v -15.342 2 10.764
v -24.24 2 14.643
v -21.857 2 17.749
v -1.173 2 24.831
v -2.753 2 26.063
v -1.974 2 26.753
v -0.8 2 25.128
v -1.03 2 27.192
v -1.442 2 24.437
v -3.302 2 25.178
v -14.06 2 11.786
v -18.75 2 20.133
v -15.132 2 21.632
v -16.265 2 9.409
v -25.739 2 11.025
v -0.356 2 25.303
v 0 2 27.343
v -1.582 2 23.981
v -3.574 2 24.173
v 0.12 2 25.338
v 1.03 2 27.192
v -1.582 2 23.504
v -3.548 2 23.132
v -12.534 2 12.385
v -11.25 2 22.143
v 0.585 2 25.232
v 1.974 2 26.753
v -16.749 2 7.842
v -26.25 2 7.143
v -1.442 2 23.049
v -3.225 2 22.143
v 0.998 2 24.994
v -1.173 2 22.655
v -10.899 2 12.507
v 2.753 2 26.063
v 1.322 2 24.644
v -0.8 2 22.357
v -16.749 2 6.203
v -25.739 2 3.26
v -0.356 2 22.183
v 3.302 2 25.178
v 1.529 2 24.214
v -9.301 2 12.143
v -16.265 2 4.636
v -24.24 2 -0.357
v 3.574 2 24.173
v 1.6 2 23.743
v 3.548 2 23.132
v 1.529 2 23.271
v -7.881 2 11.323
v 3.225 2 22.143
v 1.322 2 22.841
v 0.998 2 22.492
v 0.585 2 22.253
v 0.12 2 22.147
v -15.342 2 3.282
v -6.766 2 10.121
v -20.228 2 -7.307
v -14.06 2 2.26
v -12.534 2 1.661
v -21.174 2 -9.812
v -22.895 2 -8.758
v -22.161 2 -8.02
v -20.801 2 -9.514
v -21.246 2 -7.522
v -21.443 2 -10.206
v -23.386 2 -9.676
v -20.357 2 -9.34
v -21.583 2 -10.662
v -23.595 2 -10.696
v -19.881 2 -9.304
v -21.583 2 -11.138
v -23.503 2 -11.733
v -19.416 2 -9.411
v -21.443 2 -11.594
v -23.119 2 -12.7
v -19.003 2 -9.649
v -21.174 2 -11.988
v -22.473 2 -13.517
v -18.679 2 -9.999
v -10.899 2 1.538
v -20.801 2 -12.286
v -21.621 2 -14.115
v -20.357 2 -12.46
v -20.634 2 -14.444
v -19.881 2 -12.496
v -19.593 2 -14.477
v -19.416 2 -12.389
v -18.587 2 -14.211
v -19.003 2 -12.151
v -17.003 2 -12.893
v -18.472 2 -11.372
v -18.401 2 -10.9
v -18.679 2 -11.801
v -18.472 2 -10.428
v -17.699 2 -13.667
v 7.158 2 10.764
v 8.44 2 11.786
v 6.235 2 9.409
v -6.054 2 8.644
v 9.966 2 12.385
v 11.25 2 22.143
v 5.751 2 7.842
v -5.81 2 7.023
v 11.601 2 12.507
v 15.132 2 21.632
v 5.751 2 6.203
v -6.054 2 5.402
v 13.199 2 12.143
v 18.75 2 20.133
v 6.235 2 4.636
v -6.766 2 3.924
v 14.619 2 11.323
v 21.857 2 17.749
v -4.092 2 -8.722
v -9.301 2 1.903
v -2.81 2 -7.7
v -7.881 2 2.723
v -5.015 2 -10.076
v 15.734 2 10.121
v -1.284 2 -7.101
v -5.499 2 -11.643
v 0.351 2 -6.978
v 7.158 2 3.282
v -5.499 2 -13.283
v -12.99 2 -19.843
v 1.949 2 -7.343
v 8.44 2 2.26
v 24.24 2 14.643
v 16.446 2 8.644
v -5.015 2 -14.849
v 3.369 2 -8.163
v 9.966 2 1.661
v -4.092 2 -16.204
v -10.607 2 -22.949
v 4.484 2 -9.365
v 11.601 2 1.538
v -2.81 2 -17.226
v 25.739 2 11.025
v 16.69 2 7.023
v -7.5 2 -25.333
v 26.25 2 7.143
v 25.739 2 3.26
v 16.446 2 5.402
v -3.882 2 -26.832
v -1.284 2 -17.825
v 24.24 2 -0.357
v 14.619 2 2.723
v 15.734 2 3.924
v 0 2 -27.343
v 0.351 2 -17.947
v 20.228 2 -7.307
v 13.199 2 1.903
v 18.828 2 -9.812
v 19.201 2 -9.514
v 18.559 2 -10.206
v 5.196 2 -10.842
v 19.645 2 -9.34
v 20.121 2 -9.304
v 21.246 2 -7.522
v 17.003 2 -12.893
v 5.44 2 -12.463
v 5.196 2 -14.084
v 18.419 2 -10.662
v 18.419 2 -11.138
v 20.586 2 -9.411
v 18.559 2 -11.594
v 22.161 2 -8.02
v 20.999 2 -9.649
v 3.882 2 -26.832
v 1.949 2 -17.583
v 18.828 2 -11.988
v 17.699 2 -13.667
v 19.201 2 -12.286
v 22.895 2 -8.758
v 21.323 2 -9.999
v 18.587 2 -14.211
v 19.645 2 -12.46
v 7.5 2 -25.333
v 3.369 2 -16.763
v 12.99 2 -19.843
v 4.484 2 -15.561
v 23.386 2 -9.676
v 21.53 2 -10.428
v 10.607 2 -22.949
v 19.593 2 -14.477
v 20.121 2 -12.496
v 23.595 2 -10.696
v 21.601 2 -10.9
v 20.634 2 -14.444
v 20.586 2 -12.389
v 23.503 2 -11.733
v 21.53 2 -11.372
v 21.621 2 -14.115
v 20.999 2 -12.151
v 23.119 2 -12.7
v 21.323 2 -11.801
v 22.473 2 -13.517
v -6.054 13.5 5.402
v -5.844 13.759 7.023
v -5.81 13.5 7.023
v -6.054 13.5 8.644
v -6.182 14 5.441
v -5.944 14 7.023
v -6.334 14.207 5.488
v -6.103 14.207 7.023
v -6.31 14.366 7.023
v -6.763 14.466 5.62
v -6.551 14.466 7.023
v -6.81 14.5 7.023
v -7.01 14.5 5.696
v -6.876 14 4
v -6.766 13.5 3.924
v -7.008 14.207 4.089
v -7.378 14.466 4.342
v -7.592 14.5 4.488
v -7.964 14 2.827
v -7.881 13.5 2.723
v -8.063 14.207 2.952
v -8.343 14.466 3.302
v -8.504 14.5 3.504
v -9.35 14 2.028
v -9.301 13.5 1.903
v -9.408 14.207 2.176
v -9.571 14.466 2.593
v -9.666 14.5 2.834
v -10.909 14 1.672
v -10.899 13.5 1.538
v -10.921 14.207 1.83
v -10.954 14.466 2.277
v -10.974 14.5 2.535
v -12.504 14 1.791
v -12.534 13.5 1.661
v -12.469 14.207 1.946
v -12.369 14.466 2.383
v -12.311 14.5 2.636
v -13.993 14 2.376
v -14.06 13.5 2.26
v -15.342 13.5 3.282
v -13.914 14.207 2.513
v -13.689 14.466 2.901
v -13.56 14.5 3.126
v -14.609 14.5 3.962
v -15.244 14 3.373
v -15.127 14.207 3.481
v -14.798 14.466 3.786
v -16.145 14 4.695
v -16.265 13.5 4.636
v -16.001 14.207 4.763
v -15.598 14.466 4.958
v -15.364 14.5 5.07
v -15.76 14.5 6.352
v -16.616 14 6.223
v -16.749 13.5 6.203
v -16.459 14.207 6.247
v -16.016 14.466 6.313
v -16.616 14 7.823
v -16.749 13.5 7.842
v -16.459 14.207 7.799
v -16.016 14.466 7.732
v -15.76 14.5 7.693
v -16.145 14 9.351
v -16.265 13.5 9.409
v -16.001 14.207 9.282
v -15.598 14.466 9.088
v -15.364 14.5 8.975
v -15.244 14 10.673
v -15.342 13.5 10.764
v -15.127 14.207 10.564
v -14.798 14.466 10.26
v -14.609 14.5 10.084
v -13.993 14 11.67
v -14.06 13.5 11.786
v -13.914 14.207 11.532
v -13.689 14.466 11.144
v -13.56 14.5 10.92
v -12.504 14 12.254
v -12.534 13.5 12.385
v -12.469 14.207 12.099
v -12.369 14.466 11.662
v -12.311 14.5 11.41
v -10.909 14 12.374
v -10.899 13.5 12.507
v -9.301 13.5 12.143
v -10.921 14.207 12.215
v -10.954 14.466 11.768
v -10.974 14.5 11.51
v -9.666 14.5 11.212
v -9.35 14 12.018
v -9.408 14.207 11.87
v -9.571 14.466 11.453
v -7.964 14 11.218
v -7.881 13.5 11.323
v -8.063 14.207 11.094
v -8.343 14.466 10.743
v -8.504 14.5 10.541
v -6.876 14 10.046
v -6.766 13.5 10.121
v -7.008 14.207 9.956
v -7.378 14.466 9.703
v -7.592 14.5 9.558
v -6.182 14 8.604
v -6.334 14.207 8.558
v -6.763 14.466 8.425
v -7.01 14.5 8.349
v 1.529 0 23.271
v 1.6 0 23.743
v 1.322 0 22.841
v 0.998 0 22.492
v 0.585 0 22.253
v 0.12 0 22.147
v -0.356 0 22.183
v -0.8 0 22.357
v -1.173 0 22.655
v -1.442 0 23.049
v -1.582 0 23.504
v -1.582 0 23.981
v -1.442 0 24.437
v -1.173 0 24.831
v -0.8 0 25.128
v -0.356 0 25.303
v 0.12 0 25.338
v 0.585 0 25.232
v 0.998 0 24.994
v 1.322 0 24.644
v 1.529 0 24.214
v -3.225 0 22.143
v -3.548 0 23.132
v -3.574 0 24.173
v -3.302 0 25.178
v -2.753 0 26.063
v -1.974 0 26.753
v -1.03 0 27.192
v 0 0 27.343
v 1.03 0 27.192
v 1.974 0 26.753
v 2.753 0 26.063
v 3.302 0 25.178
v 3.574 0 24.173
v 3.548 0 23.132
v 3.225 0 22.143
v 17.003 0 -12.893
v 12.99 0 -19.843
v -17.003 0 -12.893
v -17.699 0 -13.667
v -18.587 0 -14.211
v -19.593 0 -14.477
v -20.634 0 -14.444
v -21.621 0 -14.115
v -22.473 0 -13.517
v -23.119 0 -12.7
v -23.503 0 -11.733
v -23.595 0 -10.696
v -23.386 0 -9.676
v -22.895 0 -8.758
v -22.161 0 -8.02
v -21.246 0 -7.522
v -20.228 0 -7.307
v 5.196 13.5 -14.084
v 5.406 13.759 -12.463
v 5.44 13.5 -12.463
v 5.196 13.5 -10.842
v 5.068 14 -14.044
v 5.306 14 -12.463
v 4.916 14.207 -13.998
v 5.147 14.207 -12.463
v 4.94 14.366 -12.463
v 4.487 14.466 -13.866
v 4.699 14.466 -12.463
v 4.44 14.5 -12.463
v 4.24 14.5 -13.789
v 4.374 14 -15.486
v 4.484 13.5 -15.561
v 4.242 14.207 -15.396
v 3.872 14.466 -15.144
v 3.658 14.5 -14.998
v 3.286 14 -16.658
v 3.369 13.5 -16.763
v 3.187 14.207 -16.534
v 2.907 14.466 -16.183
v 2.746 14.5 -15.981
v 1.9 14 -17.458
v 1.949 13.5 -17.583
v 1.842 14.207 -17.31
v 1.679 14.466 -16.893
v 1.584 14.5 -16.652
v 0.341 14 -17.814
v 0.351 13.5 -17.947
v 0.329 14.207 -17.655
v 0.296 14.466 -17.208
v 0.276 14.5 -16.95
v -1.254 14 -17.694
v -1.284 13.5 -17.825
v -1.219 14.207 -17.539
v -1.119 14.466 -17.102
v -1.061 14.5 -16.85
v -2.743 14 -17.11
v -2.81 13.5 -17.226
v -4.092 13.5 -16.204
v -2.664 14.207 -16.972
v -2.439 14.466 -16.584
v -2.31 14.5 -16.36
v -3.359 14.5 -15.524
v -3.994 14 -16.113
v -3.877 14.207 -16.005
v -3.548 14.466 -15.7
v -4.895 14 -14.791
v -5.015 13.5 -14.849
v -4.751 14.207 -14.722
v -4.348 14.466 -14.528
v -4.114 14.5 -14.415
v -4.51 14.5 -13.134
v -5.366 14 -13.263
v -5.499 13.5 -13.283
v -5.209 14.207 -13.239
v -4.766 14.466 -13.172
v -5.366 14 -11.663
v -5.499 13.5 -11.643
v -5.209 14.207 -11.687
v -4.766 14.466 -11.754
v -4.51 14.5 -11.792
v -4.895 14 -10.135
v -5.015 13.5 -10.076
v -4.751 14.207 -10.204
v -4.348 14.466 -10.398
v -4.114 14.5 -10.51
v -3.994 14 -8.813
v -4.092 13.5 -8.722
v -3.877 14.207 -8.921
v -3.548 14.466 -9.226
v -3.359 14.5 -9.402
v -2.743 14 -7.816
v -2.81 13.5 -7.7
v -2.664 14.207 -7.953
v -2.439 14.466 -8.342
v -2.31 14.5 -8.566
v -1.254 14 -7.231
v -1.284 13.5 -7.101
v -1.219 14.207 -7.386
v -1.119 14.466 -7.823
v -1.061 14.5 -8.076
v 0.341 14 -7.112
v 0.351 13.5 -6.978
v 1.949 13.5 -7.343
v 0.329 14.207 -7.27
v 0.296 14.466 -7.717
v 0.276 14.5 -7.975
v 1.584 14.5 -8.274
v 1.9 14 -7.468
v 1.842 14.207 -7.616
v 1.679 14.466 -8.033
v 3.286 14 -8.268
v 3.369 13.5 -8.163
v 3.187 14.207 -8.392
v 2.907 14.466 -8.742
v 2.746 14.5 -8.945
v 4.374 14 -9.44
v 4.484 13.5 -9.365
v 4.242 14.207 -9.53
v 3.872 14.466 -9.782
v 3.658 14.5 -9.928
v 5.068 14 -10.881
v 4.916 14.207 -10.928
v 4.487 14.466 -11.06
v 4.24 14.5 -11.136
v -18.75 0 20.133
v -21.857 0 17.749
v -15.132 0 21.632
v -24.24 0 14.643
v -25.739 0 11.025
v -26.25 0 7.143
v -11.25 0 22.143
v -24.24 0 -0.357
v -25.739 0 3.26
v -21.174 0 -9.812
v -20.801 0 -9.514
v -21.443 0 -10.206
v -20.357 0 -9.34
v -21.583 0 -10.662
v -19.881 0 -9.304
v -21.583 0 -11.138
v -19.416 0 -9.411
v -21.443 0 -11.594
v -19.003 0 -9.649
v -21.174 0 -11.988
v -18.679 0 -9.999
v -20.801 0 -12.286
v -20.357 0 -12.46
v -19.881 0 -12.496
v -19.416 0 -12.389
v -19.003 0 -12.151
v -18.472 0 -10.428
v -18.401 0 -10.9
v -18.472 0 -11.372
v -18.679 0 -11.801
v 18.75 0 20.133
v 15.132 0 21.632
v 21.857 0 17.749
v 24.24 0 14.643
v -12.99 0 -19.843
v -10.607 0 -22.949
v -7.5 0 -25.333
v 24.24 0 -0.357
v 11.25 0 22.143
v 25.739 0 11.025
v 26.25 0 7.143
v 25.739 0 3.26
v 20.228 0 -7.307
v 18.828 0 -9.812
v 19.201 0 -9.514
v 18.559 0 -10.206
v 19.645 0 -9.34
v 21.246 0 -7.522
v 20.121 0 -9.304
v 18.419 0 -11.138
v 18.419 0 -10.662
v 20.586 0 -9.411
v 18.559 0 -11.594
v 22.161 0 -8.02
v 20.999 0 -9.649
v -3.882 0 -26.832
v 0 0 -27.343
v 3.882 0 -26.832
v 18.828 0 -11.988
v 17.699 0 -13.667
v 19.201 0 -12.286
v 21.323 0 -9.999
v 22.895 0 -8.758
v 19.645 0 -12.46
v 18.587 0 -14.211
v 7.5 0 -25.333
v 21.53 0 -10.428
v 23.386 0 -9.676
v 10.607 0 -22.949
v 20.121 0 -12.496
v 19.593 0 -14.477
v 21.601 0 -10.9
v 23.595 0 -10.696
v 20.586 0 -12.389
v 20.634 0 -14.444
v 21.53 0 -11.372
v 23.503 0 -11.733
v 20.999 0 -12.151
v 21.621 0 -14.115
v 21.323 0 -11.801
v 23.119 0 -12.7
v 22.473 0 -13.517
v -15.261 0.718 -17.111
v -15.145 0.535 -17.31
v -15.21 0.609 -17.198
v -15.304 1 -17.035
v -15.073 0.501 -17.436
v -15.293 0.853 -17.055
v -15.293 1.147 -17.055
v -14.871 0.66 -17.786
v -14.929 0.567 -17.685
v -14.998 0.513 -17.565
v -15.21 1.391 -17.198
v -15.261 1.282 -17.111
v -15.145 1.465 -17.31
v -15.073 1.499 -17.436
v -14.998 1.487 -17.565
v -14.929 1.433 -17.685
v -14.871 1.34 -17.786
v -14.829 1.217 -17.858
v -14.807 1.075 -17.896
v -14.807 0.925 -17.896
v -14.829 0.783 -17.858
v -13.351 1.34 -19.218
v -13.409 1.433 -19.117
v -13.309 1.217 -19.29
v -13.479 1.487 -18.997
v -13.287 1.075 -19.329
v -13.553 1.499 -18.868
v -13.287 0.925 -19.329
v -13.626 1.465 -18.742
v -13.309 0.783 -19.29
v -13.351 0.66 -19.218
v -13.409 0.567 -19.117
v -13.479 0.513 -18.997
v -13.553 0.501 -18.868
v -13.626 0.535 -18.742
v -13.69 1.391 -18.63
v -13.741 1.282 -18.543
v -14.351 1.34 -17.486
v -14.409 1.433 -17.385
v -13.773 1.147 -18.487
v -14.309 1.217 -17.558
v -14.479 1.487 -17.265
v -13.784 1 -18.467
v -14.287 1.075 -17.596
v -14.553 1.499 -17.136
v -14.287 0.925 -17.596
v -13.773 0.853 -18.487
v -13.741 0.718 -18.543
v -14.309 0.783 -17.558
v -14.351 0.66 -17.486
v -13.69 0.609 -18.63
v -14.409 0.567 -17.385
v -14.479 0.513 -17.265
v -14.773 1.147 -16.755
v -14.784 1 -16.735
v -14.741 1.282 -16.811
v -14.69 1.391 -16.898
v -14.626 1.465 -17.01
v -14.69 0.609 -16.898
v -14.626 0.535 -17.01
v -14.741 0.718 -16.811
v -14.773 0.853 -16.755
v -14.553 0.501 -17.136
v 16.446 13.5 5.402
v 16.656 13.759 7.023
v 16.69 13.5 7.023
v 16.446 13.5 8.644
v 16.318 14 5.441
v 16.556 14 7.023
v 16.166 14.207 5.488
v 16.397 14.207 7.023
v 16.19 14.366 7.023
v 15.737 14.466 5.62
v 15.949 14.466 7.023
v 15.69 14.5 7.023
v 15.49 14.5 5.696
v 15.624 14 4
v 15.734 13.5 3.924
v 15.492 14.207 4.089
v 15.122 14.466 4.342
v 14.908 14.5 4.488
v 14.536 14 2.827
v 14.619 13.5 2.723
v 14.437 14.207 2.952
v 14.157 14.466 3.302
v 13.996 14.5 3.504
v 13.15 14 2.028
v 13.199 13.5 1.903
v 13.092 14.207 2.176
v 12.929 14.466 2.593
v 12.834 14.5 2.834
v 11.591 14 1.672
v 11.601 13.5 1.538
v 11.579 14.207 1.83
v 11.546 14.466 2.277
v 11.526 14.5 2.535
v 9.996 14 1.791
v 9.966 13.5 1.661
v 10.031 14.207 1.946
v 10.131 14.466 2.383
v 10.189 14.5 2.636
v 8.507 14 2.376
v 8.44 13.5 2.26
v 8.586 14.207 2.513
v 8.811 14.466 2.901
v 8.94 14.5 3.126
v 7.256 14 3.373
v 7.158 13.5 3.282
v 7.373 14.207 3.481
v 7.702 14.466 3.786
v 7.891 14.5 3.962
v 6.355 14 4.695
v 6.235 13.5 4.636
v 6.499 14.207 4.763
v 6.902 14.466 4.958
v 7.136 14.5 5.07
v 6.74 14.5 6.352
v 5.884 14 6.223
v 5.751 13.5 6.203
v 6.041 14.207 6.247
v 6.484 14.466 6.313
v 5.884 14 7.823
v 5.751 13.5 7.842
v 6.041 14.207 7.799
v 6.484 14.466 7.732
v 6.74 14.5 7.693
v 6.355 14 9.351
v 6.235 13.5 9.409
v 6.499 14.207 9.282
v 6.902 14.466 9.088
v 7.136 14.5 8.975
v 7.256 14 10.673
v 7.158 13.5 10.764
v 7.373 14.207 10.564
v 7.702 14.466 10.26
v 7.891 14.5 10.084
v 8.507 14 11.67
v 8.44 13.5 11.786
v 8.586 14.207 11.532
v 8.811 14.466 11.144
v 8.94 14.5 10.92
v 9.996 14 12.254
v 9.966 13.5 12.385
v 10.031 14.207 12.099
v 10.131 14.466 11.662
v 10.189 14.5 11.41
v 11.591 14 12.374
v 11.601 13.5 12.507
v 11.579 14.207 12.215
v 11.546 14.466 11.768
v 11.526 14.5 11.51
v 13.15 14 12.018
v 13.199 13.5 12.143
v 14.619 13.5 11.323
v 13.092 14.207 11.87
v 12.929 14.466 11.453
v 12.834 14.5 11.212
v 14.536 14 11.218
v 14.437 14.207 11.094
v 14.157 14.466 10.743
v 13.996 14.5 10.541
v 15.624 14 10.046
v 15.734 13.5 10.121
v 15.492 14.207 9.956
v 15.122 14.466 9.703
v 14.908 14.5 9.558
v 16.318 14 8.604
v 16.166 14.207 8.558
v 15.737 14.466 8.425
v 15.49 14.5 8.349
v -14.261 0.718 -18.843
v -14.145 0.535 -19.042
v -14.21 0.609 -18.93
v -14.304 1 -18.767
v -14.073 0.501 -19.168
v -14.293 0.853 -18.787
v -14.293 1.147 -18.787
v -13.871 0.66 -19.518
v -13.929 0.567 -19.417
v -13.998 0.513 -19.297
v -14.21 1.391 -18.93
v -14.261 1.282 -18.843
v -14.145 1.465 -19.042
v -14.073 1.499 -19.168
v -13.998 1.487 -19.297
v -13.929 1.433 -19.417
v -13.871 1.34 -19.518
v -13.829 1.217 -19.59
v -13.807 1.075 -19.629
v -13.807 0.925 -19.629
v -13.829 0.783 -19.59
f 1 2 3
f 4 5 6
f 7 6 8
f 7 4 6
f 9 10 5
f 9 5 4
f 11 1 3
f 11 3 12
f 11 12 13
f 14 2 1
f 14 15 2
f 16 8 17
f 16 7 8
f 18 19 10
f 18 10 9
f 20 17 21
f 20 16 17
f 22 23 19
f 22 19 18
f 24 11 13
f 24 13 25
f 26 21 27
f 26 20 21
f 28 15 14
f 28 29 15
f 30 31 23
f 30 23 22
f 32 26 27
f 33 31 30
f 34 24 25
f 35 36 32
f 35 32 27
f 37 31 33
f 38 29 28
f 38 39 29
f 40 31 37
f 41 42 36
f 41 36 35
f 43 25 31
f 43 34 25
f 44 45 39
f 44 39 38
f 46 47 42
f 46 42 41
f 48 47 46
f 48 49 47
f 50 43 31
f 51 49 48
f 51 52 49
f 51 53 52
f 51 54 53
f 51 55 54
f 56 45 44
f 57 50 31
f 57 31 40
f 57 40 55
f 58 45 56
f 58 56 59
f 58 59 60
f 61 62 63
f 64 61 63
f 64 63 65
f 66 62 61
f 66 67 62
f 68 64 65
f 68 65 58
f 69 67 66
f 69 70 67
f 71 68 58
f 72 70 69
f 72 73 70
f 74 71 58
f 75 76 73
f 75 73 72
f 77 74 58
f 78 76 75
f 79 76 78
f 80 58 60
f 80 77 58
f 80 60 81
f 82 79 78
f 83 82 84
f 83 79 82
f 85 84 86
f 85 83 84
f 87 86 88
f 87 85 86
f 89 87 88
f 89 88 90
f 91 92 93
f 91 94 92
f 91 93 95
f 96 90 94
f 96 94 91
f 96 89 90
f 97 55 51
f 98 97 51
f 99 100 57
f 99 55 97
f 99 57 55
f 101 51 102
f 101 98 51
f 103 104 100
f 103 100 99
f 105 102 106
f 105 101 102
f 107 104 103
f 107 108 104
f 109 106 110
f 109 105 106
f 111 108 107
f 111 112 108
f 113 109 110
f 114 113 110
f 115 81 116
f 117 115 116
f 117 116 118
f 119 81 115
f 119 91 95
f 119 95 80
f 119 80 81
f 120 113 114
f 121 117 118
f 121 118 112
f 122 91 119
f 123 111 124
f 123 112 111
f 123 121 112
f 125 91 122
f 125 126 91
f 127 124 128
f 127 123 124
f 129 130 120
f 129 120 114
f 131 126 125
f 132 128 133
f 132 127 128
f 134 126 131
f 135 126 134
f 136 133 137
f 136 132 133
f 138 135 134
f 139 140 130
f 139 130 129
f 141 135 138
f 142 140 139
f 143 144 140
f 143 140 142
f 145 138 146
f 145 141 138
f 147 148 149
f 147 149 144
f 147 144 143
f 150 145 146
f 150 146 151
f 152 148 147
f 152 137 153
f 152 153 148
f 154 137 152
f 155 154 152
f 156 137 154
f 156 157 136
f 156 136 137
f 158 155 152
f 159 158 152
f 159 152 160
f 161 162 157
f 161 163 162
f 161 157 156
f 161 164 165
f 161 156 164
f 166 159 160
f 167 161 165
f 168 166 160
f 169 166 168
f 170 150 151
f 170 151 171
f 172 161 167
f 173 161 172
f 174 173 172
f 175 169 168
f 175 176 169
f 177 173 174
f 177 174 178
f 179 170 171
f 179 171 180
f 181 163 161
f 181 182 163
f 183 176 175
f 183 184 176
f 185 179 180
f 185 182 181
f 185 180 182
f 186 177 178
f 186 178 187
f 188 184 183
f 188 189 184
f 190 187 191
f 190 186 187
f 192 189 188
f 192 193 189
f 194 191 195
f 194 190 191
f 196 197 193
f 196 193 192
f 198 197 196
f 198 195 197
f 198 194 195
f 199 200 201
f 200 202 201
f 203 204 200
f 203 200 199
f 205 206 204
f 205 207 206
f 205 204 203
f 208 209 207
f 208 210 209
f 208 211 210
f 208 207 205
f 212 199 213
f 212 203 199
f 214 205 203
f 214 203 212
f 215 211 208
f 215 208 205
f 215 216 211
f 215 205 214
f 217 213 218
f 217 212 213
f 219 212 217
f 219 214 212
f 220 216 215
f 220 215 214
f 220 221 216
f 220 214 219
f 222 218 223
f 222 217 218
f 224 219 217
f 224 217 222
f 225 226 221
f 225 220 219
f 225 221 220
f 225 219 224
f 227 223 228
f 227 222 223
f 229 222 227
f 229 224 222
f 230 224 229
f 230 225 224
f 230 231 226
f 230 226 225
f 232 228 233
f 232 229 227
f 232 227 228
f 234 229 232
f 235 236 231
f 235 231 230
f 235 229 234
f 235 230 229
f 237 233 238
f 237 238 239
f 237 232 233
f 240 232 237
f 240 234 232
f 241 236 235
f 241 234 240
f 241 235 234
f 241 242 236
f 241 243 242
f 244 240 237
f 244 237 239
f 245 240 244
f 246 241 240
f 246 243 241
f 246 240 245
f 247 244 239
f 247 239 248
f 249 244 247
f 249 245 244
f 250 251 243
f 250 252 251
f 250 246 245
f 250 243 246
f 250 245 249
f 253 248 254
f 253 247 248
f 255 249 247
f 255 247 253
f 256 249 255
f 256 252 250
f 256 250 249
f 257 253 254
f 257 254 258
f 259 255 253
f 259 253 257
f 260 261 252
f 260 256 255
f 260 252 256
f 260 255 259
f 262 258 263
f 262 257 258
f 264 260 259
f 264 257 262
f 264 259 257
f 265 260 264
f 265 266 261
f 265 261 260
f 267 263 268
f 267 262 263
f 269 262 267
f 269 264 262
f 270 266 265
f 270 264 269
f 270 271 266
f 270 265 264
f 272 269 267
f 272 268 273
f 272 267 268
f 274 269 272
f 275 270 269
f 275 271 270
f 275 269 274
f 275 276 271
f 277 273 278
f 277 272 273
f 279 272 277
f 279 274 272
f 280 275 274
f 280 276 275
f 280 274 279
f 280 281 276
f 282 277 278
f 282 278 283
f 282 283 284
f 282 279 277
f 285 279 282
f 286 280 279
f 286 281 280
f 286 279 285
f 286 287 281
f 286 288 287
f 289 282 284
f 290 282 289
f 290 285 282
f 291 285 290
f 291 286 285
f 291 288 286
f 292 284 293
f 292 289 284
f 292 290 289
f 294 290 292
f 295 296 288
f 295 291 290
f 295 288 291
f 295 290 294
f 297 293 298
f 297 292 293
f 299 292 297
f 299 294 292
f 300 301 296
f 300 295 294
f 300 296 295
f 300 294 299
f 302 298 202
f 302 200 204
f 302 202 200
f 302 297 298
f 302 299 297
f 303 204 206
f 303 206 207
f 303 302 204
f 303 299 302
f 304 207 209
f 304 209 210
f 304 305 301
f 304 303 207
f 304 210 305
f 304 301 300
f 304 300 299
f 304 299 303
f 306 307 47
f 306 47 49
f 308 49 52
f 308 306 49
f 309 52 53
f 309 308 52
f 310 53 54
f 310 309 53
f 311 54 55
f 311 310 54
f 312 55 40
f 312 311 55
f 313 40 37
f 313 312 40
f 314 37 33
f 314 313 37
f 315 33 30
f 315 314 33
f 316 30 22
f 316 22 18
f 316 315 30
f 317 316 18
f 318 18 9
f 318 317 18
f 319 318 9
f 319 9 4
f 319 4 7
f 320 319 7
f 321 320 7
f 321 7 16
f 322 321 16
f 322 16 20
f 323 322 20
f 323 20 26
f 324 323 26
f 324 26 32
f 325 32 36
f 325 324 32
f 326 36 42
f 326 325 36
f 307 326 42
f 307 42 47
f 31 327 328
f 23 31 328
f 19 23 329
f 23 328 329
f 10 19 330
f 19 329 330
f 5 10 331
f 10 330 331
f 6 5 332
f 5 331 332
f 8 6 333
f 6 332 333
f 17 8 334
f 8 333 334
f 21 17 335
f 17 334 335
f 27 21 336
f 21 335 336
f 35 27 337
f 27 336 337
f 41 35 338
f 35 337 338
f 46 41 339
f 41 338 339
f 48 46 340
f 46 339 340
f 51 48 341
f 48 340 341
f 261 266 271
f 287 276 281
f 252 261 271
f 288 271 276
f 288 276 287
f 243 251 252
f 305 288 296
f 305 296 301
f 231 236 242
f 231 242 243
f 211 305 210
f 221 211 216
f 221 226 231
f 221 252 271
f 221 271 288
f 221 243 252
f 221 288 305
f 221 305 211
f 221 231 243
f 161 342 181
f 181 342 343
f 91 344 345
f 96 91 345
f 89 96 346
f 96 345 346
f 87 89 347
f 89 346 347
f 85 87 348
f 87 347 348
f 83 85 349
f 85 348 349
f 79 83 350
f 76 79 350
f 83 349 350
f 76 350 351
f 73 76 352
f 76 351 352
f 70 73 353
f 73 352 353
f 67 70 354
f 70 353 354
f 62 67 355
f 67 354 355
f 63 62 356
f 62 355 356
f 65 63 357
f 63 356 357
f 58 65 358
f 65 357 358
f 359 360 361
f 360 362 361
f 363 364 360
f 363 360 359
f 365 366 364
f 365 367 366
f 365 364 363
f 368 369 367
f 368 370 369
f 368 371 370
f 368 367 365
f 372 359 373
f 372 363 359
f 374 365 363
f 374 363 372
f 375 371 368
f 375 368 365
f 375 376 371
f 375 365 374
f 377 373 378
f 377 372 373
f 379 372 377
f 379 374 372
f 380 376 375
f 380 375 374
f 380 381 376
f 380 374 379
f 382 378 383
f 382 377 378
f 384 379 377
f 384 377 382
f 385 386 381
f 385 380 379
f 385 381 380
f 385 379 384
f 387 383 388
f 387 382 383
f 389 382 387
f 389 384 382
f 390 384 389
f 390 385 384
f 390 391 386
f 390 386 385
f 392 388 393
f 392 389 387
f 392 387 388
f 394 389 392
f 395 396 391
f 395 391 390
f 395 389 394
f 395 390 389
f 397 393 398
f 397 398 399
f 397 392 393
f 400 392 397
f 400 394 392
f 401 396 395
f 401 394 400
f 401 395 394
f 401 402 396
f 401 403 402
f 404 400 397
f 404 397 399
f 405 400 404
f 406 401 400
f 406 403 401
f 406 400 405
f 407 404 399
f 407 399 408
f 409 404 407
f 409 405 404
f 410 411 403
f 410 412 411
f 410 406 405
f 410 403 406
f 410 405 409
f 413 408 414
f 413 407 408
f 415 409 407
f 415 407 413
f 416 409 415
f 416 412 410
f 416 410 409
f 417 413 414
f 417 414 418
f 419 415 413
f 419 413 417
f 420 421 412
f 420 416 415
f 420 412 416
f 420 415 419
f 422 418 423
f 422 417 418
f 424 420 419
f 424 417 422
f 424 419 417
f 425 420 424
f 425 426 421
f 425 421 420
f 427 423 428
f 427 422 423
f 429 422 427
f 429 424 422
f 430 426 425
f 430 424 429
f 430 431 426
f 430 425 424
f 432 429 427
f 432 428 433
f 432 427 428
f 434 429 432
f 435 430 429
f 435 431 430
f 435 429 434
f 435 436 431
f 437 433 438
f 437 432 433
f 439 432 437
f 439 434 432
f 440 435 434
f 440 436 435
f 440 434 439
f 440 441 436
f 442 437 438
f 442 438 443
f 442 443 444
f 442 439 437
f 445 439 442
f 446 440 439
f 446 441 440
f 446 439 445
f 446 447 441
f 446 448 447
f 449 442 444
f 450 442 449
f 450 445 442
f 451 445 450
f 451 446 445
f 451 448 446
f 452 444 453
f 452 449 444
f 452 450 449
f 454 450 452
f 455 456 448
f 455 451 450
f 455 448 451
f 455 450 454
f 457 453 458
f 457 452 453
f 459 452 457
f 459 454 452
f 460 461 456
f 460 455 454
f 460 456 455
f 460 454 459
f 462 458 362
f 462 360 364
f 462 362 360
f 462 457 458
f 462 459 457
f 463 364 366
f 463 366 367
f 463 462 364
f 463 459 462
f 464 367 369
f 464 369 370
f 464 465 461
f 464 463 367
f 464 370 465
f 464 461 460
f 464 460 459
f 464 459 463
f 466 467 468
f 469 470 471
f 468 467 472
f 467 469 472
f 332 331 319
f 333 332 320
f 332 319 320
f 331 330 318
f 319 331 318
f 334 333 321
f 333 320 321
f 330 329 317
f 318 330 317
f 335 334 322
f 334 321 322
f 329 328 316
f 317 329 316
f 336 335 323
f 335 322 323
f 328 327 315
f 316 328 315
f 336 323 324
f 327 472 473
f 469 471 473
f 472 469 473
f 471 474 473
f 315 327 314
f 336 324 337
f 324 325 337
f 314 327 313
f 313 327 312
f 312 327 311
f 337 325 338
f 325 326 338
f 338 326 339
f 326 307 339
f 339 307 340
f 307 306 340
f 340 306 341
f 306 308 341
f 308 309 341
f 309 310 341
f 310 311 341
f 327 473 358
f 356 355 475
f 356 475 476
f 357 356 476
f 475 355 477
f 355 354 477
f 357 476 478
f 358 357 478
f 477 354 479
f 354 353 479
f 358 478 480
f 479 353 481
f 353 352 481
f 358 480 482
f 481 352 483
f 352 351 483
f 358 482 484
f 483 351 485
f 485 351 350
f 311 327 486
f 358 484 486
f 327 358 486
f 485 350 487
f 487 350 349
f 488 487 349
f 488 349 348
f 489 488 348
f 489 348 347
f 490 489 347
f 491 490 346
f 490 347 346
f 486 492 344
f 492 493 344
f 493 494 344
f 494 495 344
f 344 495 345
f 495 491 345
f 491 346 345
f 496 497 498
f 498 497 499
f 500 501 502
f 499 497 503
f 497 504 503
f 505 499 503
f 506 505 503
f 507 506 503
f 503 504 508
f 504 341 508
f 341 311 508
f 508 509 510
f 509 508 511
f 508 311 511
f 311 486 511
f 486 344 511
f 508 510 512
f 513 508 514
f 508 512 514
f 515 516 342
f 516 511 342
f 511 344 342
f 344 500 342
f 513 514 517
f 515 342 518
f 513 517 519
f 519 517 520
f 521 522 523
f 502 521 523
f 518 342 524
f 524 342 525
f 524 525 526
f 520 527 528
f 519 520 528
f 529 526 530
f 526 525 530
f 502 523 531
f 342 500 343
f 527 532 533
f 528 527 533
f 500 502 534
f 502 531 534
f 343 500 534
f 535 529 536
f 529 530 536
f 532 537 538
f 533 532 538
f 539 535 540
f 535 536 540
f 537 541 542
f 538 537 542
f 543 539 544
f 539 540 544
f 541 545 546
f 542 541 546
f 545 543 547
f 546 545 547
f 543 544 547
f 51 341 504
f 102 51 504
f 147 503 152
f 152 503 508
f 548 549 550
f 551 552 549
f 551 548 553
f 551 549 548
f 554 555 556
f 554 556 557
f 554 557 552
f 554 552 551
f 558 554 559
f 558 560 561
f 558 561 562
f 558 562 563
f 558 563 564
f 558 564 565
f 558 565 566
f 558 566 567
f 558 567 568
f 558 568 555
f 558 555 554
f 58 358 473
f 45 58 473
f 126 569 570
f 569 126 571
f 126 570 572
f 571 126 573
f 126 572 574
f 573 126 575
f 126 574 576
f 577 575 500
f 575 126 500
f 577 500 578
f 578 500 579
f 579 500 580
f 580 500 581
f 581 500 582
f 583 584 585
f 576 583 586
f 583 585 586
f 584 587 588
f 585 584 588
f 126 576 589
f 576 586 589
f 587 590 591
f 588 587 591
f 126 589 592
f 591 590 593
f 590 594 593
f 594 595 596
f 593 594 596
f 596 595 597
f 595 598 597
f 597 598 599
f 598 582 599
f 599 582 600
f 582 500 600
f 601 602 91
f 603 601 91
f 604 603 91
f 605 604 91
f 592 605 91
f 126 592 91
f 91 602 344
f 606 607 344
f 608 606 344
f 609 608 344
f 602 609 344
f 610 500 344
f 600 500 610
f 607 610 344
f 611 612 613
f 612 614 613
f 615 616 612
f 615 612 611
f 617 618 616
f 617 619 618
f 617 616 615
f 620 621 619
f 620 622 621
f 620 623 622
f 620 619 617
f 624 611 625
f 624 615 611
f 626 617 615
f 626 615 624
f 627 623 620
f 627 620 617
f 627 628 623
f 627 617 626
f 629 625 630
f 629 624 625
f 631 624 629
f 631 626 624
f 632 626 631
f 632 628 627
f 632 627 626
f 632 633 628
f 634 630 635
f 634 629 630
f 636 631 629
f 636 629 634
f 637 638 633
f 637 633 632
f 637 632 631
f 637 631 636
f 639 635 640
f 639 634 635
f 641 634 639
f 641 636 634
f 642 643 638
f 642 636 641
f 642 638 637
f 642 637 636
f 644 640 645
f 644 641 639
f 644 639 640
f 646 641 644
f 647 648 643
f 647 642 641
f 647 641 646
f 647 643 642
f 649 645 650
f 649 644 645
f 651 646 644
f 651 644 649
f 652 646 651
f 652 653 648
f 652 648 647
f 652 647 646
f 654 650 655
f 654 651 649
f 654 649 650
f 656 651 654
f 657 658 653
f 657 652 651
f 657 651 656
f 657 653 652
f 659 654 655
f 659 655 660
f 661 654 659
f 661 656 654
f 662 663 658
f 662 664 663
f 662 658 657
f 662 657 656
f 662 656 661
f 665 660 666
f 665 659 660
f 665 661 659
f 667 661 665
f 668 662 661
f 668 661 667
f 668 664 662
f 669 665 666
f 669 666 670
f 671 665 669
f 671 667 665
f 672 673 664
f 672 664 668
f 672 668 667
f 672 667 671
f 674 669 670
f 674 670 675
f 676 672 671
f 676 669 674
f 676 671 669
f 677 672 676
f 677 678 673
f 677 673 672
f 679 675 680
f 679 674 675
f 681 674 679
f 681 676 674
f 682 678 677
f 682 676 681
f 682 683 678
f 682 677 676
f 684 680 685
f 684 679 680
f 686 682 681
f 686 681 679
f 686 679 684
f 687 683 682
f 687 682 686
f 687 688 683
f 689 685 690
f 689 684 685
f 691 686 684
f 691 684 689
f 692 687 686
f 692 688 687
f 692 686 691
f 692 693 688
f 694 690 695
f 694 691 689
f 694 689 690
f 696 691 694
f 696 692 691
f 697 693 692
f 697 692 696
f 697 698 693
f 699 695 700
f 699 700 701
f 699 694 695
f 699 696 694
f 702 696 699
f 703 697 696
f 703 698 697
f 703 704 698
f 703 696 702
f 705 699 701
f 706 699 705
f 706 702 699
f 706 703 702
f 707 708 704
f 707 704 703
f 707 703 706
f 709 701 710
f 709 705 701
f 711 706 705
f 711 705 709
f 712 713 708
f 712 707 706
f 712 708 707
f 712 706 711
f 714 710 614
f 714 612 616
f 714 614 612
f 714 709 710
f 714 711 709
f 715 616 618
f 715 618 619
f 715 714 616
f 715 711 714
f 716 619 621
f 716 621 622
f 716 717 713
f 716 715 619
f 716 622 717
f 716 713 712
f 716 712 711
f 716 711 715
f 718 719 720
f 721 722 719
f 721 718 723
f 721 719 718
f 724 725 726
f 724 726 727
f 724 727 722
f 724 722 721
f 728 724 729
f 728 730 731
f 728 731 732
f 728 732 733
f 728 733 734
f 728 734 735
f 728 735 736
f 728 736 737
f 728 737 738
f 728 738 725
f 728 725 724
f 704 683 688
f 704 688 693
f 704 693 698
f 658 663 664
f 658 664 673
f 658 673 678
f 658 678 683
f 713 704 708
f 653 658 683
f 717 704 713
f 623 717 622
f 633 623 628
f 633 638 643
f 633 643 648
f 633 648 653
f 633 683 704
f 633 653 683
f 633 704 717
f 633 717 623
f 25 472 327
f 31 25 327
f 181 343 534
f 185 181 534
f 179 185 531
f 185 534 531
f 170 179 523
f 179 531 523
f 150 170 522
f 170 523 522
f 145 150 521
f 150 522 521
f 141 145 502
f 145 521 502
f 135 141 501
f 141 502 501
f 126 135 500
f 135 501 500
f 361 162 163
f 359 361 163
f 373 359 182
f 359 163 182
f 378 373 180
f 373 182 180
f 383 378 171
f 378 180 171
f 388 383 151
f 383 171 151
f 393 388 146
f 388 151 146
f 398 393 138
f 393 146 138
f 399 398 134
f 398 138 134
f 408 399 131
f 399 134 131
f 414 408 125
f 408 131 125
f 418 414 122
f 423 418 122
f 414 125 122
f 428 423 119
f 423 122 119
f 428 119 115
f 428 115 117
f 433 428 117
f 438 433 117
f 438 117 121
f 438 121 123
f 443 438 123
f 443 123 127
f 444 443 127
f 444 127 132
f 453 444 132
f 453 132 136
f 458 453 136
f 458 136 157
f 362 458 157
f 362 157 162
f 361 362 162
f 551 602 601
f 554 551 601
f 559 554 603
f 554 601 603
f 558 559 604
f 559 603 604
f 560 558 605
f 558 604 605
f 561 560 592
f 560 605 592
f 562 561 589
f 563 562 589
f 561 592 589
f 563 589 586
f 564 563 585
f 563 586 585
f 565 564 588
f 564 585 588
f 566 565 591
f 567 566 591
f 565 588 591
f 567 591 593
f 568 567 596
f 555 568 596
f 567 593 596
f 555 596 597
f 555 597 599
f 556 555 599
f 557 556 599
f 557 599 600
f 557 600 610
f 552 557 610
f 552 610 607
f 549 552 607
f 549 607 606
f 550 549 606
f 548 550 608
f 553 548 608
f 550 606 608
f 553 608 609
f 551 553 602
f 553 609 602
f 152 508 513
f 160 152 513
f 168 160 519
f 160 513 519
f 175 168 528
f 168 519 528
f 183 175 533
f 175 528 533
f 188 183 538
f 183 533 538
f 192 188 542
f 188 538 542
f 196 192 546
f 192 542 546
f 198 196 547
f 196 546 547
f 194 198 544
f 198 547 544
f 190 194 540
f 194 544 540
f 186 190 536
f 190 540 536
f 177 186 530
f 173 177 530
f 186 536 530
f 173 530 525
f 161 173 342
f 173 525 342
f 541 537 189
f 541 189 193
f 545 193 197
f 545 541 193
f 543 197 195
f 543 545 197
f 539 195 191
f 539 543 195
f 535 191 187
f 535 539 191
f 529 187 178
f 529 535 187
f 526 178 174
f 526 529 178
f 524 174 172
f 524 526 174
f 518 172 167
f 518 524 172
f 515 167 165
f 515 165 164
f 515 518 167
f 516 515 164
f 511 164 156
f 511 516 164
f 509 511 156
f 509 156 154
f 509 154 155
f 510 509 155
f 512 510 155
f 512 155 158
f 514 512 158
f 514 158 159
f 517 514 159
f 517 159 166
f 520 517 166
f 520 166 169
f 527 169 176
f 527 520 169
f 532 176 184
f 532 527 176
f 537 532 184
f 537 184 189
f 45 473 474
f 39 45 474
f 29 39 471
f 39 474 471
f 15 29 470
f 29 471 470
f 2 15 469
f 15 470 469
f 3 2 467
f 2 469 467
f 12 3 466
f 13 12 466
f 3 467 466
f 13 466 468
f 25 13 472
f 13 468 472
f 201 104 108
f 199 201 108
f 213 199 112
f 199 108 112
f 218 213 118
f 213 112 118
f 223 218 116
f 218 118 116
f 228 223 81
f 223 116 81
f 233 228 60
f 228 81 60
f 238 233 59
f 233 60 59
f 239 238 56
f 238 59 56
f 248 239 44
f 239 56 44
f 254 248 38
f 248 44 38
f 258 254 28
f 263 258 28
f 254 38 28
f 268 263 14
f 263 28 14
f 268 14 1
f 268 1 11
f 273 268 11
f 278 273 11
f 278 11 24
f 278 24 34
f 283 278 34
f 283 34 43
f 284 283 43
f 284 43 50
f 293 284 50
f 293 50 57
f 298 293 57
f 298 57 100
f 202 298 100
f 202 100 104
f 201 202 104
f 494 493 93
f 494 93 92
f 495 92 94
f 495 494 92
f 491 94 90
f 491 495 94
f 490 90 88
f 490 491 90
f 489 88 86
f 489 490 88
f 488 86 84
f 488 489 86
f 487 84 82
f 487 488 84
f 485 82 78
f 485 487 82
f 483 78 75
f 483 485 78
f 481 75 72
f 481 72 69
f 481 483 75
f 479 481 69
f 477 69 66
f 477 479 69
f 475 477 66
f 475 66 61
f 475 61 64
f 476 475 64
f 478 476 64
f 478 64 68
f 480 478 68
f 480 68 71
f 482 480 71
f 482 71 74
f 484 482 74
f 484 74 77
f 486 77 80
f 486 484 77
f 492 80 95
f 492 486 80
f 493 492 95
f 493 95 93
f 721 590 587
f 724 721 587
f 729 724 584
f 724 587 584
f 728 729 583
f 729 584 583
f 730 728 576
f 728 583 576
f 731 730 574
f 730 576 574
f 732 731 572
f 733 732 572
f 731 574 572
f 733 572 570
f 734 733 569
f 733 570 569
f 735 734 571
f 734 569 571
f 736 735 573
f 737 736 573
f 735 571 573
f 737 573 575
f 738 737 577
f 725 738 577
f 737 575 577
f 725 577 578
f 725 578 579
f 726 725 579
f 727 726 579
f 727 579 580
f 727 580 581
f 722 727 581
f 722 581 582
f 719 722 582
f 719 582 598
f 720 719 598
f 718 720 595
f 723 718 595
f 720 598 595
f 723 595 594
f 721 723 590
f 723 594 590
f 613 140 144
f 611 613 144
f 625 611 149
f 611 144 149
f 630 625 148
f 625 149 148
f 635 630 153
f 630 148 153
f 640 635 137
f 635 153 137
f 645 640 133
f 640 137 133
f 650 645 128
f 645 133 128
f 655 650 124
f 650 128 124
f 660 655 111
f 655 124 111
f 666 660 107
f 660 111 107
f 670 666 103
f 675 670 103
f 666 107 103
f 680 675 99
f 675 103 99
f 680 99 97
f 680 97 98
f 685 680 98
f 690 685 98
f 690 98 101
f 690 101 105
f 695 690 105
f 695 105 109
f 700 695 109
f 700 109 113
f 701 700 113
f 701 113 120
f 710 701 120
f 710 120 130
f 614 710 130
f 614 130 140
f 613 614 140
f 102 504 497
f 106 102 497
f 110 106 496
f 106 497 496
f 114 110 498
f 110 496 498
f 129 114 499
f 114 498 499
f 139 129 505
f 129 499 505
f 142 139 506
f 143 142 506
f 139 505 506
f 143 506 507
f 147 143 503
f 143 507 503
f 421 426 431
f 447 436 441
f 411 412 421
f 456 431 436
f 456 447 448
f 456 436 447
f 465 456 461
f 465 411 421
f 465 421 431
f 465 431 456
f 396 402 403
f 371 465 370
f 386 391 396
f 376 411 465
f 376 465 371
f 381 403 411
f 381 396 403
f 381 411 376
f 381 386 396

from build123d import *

# Parameters (mm, degrees)
SKETCH5_R           = 1.6
BOSS_EXTRUDE2_DEPTH = 2
SKETCH6_R           = 5.5
BOSS_EXTRUDE3_DEPTH = 14.5
FILLET1_R           = 1
SKETCH7_R           = 0.5
BOSS_EXTRUDE4_DEPTH = 0.6


with BuildPart() as part:
    # Sketch5 → Boss-Extrude2 (new body)
    with BuildSketch(Plane(origin=(0, 0, 0), x_dir=(1, 0, 0), z_dir=(0, 1, 0))):
        with BuildLine():
            Line((-11.250000051, -22.142785594), (-3.22490315, -22.142785594))
            ThreePointArc((-3.22490315, -22.142785594), (-5.1e-08, -27.342785594), (3.224903048, -22.142785594))
            Line((3.224903048, -22.142785594), (11.249999949, -22.142785594))
            ThreePointArc((11.249999949, -22.142785594), (24.240381006, -14.642785594), (24.240381006, 0.357214406))
            Line((24.240381006, 0.357214406), (20.227832555, 7.30715219))
            ThreePointArc((20.227832555, 7.30715219), (23.118713105, 12.700000199), (17.002929456, 12.892848208))
            Line((17.002929456, 12.892848208), (12.990381006, 19.842785992))
            ThreePointArc((12.990381006, 19.842785992), (-5.1e-08, 27.342785992), (-12.990381108, 19.842785992))
            Line((-12.990381108, 19.842785992), (-17.002929558, 12.892848208))
            ThreePointArc((-17.002929558, 12.892848208), (-23.118713208, 12.700000199), (-20.227832658, 7.30715219))
            Line((-20.227832658, 7.30715219), (-24.240381108, 0.357214406))
            ThreePointArc((-24.240381108, 0.357214406), (-24.240381108, -14.642785594), (-11.250000051, -22.142785594))
        make_face()
        with Locations((20.001021652, 10.900000199)):
            Circle(SKETCH5_R, mode=Mode.SUBTRACT)
        with Locations((-5.1e-08, -23.742785594)):
            Circle(SKETCH5_R, mode=Mode.SUBTRACT)
        with Locations((-20.001021754, 10.900000199)):
            Circle(SKETCH5_R, mode=Mode.SUBTRACT)
    extrude(amount=BOSS_EXTRUDE2_DEPTH)

    # Sketch6 → Boss-Extrude3 (add)
    with BuildSketch(Plane(origin=(0, 0, 0), x_dir=(1, 0, 0), z_dir=(0, 1, 0))):
        with Locations((-0.060025126, 12.462836141)):
            Circle(SKETCH6_R)
        with Locations((11.189974874, -7.022735444)):
            Circle(SKETCH6_R)
        with Locations((-11.310025126, -7.022735444)):
            Circle(SKETCH6_R)
    extrude(amount=BOSS_EXTRUDE3_DEPTH)

    # Fillet1
    fillet1_edges = [part.edges().sort_by_distance(p)[0] for p in [
        (-5.560025126, 14.5, -12.462836141),
        (5.689974874, 14.5, 7.022735444),
        (-16.810025126, 14.5, 7.022735444),
    ]]
    fillet(fillet1_edges, radius=FILLET1_R)

    # Sketch7 → Boss-Extrude4 (add)
    with BuildSketch(Plane(origin=(-18.334964206, 0, -10.58569652), x_dir=(-0.5, 0, 0.866025404), z_dir=(-0.866025404, 0, -0.5))):
        with Locations((-9.600955549, 1)):
            Circle(SKETCH7_R)
        with Locations((-7.600955549, 1)):
            Circle(SKETCH7_R)
    extrude(amount=BOSS_EXTRUDE4_DEPTH)


solid = part.part
